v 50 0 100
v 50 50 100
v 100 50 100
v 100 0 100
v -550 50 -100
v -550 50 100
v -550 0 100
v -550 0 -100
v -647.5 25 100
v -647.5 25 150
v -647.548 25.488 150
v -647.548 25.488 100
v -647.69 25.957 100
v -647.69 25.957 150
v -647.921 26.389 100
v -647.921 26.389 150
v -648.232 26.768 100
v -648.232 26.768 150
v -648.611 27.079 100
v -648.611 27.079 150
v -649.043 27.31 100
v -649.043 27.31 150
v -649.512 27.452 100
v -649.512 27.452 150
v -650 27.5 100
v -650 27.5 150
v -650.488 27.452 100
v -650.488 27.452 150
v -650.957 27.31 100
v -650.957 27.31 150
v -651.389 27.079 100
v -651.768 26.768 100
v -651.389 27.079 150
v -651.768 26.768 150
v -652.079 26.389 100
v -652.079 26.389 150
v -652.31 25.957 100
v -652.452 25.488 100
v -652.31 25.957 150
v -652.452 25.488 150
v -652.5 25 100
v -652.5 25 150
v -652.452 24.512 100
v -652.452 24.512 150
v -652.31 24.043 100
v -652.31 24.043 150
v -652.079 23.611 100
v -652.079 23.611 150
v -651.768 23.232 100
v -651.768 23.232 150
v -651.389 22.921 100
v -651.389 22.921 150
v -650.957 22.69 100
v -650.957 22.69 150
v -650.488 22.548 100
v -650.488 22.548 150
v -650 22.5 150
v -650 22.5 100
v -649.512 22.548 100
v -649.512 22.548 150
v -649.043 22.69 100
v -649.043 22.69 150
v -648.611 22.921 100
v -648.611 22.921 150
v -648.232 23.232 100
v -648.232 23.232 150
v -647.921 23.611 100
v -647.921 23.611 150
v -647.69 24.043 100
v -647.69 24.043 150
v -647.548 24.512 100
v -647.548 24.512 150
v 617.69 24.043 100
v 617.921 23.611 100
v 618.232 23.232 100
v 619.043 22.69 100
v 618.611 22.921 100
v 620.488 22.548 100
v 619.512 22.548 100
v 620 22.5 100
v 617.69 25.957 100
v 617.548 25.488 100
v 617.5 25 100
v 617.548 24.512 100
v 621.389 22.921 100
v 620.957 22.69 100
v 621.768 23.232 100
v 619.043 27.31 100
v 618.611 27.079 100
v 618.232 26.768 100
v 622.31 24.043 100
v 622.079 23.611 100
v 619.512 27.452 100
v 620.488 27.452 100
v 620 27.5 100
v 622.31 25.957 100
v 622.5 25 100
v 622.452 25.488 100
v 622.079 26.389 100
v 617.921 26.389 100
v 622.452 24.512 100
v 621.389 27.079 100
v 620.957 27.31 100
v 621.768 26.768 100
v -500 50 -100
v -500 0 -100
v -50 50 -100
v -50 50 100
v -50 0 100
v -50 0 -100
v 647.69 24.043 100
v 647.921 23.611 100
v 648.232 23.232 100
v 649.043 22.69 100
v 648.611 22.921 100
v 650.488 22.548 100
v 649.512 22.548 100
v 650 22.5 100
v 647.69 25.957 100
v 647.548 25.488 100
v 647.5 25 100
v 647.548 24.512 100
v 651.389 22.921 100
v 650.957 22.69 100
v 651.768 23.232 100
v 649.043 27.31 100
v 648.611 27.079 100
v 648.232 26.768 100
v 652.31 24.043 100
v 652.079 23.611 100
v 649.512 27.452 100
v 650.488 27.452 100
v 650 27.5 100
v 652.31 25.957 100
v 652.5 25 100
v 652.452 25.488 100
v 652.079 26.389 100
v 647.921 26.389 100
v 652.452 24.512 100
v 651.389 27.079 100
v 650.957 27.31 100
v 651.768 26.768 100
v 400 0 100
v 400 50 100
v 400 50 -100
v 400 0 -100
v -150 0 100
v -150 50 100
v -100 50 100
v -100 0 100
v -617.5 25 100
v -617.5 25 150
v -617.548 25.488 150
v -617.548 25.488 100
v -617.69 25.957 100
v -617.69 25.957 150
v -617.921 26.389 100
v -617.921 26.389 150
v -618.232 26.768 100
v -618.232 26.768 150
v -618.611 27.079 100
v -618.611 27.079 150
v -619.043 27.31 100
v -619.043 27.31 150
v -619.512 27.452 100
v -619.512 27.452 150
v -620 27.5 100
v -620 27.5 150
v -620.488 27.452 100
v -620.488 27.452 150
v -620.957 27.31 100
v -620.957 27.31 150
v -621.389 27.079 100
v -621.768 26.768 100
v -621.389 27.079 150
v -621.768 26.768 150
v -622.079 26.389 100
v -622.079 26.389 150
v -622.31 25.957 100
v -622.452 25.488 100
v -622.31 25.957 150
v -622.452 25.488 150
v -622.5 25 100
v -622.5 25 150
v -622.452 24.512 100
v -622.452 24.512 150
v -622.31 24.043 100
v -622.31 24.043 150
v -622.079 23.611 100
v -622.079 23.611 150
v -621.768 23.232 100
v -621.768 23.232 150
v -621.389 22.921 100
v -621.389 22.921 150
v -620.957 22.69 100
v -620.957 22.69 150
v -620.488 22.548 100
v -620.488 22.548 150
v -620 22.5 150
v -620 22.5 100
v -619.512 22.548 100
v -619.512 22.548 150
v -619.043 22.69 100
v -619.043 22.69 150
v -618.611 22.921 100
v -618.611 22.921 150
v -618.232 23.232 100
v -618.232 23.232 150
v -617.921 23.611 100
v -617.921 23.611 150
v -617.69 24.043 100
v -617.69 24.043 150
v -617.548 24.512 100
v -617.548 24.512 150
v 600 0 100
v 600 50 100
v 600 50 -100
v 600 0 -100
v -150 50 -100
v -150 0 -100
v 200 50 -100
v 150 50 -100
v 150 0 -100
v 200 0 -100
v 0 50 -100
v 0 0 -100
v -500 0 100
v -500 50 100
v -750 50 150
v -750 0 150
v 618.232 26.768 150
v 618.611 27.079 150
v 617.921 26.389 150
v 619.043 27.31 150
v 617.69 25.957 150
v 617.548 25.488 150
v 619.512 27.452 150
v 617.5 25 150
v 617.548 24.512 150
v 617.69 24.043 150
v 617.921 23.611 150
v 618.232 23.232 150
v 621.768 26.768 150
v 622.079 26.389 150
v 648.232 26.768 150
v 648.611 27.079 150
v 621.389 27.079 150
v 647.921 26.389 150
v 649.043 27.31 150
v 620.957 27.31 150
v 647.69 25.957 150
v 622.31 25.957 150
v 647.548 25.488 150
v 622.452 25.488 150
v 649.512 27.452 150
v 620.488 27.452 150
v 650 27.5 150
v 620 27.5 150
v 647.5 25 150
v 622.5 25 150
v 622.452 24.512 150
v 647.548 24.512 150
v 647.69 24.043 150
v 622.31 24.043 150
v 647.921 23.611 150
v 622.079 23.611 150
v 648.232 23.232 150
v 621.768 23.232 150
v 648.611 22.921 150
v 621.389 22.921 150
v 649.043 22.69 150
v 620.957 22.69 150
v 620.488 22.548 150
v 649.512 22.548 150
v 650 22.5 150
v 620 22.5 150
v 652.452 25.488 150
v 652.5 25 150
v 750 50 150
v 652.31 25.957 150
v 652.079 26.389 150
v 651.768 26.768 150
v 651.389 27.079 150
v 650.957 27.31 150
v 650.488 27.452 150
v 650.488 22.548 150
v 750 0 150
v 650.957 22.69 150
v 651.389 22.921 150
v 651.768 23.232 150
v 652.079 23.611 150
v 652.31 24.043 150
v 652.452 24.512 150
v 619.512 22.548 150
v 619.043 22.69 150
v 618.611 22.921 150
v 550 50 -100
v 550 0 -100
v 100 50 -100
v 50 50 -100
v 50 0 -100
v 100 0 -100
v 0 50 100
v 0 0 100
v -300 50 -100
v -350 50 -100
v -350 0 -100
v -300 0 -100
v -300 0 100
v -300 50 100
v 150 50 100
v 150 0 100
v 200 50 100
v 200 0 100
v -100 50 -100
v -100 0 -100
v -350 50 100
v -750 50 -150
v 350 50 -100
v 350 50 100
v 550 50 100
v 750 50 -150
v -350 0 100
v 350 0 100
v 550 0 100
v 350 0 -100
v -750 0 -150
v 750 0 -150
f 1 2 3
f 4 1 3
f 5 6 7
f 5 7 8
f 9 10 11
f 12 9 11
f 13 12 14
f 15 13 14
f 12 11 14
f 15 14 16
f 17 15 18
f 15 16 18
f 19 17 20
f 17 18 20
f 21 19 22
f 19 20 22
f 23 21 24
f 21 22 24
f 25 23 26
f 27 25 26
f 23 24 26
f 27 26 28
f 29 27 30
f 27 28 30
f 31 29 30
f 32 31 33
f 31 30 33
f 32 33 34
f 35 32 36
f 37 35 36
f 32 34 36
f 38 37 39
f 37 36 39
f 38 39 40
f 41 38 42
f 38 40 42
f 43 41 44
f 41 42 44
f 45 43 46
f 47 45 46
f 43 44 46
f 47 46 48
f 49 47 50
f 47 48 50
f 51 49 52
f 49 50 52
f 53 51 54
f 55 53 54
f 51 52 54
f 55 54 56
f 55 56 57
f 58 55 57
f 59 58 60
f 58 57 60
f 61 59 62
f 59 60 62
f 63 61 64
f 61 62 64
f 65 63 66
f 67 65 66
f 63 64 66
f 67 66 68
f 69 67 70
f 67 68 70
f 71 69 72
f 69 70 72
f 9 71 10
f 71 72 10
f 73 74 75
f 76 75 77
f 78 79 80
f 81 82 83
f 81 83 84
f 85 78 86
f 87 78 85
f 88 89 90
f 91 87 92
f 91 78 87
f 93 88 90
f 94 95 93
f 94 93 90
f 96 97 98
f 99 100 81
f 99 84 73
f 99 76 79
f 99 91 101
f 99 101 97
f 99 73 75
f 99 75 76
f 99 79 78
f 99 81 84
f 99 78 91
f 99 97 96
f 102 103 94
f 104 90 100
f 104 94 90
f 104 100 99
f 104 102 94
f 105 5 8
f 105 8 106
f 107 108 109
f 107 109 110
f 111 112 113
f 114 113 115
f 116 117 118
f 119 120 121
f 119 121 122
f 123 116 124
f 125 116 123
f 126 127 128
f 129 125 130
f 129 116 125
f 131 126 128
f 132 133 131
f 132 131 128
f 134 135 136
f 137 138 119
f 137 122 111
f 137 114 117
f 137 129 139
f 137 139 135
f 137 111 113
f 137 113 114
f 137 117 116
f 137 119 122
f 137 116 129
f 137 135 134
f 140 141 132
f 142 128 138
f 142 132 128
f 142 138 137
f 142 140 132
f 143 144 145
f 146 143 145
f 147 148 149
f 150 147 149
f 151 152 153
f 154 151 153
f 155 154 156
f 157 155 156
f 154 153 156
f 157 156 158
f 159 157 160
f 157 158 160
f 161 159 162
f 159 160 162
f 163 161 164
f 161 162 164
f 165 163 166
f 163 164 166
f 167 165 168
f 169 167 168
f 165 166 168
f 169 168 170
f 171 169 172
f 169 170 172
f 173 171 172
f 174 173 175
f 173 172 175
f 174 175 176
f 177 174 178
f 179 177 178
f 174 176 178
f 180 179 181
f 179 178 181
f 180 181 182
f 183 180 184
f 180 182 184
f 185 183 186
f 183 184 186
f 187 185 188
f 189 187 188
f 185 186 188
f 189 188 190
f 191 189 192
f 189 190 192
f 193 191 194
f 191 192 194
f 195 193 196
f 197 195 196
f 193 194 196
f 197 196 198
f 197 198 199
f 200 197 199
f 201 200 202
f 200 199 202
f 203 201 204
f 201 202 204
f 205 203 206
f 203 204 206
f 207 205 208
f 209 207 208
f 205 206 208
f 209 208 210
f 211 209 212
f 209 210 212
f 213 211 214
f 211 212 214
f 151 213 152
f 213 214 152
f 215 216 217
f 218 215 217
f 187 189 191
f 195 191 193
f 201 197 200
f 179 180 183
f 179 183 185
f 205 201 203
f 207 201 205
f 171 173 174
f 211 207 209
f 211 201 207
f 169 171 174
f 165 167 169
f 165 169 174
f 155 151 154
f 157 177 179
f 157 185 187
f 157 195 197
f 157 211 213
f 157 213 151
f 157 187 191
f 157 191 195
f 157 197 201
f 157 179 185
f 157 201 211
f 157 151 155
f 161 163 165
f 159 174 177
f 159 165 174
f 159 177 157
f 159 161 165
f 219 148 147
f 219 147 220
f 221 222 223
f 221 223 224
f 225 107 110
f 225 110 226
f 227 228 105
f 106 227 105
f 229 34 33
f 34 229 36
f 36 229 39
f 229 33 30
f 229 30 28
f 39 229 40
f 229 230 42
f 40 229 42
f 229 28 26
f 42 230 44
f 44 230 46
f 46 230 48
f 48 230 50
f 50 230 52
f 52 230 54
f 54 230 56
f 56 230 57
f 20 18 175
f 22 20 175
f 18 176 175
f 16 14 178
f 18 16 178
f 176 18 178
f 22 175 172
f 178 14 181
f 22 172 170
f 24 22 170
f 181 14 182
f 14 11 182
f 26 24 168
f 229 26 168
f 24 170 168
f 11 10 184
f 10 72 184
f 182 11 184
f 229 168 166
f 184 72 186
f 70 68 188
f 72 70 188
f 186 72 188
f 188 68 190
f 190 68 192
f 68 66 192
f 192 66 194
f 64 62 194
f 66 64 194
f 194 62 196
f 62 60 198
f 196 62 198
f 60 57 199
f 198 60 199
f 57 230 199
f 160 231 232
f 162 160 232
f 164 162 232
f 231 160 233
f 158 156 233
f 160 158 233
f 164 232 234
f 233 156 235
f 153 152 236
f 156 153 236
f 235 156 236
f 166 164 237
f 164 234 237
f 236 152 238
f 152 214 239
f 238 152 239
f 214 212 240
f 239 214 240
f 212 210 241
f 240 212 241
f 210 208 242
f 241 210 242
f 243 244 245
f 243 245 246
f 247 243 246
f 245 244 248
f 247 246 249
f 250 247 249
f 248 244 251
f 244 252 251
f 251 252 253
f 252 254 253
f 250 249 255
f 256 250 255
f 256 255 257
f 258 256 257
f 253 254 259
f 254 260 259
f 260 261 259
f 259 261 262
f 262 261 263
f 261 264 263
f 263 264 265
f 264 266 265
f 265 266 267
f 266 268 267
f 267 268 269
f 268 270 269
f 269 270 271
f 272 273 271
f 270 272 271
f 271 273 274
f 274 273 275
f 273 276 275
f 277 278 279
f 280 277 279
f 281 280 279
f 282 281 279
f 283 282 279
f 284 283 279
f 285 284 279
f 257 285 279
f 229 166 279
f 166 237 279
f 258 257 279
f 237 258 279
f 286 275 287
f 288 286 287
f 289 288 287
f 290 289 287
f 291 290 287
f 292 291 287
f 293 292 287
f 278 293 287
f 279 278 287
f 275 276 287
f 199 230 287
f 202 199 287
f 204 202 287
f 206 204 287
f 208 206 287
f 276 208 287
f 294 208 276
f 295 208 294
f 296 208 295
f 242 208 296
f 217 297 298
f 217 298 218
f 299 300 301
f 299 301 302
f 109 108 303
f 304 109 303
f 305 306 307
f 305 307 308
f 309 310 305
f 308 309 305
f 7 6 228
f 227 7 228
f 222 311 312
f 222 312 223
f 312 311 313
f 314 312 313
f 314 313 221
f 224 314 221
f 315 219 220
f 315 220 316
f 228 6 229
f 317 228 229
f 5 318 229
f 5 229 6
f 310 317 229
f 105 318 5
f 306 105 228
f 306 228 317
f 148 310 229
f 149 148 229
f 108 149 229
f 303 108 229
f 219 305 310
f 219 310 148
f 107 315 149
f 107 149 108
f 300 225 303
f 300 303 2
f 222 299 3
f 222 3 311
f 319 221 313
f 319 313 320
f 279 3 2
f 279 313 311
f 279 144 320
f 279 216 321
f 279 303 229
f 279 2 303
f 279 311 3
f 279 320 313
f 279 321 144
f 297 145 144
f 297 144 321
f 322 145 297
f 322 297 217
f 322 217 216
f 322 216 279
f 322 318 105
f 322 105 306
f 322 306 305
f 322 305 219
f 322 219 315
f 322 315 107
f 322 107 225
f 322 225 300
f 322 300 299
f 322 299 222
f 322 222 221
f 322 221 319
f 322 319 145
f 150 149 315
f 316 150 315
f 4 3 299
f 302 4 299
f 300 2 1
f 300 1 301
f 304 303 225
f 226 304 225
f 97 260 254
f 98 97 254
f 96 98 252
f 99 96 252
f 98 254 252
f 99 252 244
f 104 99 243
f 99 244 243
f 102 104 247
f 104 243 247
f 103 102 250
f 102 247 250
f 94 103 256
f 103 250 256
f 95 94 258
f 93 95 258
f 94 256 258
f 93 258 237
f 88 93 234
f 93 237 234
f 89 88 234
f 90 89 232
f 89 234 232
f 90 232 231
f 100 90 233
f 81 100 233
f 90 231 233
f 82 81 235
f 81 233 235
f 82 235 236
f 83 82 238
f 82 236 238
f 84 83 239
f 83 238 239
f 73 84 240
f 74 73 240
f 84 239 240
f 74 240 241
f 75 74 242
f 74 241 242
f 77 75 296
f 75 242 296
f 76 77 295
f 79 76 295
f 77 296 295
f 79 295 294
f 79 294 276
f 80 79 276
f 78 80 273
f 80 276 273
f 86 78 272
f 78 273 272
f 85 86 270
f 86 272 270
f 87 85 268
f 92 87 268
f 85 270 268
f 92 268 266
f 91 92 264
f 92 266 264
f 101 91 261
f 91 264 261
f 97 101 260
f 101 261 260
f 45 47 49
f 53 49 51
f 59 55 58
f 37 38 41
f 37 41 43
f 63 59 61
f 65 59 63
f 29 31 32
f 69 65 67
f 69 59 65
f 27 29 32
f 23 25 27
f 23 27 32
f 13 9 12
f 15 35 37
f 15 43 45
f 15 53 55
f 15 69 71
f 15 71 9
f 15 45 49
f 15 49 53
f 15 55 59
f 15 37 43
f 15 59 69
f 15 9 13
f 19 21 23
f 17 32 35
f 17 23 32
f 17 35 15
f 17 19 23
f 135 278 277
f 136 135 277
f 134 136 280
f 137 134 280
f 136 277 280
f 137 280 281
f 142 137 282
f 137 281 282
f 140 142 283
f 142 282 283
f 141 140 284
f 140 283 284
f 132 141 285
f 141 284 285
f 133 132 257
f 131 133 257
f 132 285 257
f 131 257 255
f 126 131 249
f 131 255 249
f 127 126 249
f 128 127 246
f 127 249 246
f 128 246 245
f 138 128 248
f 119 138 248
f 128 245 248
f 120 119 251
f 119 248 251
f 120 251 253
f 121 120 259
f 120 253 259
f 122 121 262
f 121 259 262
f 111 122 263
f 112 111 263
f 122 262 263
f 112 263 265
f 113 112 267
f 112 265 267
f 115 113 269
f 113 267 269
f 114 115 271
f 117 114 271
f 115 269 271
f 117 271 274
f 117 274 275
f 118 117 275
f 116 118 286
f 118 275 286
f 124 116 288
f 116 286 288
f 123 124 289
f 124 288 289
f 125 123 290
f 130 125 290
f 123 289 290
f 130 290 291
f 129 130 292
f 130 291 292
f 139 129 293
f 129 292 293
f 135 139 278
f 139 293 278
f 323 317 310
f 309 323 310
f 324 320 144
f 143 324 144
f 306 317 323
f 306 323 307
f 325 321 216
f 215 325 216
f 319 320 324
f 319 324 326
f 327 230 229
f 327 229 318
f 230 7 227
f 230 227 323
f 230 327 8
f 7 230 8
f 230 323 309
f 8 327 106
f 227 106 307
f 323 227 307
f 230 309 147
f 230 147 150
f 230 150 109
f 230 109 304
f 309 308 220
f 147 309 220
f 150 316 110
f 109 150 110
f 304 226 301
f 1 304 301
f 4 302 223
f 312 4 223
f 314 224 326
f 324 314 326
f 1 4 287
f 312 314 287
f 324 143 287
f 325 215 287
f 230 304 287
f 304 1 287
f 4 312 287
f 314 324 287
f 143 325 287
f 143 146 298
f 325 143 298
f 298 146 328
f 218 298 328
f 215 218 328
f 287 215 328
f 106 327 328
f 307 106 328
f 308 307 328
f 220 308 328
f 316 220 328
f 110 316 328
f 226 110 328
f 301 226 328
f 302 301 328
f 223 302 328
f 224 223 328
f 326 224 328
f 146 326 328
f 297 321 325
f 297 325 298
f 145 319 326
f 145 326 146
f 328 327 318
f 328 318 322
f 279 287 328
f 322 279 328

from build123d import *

# Parameters (mm, degrees)
SKETCH1_W           = 1500
SKETCH1_H           = 300
BOSS_EXTRUDE1_DEPTH = 50
SKETCH2_R           = 2.5
CUT_EXTRUDE1_DEPTH  = 50
SKETCH3_W           = 50
SKETCH3_H           = 200
CUT_EXTRUDE2_DEPTH  = 767.485485838


with BuildPart() as part:
    # Sketch1 → Boss-Extrude1 (new body)
    with BuildSketch(Plane(origin=(0, 0, 0), x_dir=(1, 0, 0), z_dir=(0, 1, 0))):
        Rectangle(SKETCH1_W, SKETCH1_H)
    extrude(amount=BOSS_EXTRUDE1_DEPTH)

    # Sketch2 → Cut-Extrude1 (cut)
    with BuildSketch(Plane.XY.offset(150)):
        with Locations((-650, 25)):
            Circle(SKETCH2_R)
        with Locations((-620, 25)):
            Circle(SKETCH2_R)
        with Locations((620, 25)):
            Circle(SKETCH2_R)
        with Locations((650, 25)):
            Circle(SKETCH2_R)
    extrude(amount=-CUT_EXTRUDE1_DEPTH, mode=Mode.SUBTRACT)

    # Sketch3 → Cut-Extrude2 (cut, through all)
    with BuildSketch(Plane(origin=(0, 50, 0), x_dir=(1, 0, 0), z_dir=(0, 1, 0))):
        with Locations((-525, 0)):
            Rectangle(SKETCH3_W, SKETCH3_H)
        with Locations((-325, 0)):
            Rectangle(SKETCH3_W, SKETCH3_H)
        with Locations((-125, 0)):
            Rectangle(SKETCH3_W, SKETCH3_H)
        with Locations((-25, 0)):
            Rectangle(SKETCH3_W, SKETCH3_H)
        with Locations((75, 0)):
            Rectangle(SKETCH3_W, SKETCH3_H)
        with Locations((175, 0)):
            Rectangle(SKETCH3_W, SKETCH3_H)
        with Locations((375, 0)):
            Rectangle(SKETCH3_W, SKETCH3_H)
        with Locations((575, 0)):
            Rectangle(SKETCH3_W, SKETCH3_H)
    extrude(amount=-CUT_EXTRUDE2_DEPTH, mode=Mode.SUBTRACT)


solid = part.part
